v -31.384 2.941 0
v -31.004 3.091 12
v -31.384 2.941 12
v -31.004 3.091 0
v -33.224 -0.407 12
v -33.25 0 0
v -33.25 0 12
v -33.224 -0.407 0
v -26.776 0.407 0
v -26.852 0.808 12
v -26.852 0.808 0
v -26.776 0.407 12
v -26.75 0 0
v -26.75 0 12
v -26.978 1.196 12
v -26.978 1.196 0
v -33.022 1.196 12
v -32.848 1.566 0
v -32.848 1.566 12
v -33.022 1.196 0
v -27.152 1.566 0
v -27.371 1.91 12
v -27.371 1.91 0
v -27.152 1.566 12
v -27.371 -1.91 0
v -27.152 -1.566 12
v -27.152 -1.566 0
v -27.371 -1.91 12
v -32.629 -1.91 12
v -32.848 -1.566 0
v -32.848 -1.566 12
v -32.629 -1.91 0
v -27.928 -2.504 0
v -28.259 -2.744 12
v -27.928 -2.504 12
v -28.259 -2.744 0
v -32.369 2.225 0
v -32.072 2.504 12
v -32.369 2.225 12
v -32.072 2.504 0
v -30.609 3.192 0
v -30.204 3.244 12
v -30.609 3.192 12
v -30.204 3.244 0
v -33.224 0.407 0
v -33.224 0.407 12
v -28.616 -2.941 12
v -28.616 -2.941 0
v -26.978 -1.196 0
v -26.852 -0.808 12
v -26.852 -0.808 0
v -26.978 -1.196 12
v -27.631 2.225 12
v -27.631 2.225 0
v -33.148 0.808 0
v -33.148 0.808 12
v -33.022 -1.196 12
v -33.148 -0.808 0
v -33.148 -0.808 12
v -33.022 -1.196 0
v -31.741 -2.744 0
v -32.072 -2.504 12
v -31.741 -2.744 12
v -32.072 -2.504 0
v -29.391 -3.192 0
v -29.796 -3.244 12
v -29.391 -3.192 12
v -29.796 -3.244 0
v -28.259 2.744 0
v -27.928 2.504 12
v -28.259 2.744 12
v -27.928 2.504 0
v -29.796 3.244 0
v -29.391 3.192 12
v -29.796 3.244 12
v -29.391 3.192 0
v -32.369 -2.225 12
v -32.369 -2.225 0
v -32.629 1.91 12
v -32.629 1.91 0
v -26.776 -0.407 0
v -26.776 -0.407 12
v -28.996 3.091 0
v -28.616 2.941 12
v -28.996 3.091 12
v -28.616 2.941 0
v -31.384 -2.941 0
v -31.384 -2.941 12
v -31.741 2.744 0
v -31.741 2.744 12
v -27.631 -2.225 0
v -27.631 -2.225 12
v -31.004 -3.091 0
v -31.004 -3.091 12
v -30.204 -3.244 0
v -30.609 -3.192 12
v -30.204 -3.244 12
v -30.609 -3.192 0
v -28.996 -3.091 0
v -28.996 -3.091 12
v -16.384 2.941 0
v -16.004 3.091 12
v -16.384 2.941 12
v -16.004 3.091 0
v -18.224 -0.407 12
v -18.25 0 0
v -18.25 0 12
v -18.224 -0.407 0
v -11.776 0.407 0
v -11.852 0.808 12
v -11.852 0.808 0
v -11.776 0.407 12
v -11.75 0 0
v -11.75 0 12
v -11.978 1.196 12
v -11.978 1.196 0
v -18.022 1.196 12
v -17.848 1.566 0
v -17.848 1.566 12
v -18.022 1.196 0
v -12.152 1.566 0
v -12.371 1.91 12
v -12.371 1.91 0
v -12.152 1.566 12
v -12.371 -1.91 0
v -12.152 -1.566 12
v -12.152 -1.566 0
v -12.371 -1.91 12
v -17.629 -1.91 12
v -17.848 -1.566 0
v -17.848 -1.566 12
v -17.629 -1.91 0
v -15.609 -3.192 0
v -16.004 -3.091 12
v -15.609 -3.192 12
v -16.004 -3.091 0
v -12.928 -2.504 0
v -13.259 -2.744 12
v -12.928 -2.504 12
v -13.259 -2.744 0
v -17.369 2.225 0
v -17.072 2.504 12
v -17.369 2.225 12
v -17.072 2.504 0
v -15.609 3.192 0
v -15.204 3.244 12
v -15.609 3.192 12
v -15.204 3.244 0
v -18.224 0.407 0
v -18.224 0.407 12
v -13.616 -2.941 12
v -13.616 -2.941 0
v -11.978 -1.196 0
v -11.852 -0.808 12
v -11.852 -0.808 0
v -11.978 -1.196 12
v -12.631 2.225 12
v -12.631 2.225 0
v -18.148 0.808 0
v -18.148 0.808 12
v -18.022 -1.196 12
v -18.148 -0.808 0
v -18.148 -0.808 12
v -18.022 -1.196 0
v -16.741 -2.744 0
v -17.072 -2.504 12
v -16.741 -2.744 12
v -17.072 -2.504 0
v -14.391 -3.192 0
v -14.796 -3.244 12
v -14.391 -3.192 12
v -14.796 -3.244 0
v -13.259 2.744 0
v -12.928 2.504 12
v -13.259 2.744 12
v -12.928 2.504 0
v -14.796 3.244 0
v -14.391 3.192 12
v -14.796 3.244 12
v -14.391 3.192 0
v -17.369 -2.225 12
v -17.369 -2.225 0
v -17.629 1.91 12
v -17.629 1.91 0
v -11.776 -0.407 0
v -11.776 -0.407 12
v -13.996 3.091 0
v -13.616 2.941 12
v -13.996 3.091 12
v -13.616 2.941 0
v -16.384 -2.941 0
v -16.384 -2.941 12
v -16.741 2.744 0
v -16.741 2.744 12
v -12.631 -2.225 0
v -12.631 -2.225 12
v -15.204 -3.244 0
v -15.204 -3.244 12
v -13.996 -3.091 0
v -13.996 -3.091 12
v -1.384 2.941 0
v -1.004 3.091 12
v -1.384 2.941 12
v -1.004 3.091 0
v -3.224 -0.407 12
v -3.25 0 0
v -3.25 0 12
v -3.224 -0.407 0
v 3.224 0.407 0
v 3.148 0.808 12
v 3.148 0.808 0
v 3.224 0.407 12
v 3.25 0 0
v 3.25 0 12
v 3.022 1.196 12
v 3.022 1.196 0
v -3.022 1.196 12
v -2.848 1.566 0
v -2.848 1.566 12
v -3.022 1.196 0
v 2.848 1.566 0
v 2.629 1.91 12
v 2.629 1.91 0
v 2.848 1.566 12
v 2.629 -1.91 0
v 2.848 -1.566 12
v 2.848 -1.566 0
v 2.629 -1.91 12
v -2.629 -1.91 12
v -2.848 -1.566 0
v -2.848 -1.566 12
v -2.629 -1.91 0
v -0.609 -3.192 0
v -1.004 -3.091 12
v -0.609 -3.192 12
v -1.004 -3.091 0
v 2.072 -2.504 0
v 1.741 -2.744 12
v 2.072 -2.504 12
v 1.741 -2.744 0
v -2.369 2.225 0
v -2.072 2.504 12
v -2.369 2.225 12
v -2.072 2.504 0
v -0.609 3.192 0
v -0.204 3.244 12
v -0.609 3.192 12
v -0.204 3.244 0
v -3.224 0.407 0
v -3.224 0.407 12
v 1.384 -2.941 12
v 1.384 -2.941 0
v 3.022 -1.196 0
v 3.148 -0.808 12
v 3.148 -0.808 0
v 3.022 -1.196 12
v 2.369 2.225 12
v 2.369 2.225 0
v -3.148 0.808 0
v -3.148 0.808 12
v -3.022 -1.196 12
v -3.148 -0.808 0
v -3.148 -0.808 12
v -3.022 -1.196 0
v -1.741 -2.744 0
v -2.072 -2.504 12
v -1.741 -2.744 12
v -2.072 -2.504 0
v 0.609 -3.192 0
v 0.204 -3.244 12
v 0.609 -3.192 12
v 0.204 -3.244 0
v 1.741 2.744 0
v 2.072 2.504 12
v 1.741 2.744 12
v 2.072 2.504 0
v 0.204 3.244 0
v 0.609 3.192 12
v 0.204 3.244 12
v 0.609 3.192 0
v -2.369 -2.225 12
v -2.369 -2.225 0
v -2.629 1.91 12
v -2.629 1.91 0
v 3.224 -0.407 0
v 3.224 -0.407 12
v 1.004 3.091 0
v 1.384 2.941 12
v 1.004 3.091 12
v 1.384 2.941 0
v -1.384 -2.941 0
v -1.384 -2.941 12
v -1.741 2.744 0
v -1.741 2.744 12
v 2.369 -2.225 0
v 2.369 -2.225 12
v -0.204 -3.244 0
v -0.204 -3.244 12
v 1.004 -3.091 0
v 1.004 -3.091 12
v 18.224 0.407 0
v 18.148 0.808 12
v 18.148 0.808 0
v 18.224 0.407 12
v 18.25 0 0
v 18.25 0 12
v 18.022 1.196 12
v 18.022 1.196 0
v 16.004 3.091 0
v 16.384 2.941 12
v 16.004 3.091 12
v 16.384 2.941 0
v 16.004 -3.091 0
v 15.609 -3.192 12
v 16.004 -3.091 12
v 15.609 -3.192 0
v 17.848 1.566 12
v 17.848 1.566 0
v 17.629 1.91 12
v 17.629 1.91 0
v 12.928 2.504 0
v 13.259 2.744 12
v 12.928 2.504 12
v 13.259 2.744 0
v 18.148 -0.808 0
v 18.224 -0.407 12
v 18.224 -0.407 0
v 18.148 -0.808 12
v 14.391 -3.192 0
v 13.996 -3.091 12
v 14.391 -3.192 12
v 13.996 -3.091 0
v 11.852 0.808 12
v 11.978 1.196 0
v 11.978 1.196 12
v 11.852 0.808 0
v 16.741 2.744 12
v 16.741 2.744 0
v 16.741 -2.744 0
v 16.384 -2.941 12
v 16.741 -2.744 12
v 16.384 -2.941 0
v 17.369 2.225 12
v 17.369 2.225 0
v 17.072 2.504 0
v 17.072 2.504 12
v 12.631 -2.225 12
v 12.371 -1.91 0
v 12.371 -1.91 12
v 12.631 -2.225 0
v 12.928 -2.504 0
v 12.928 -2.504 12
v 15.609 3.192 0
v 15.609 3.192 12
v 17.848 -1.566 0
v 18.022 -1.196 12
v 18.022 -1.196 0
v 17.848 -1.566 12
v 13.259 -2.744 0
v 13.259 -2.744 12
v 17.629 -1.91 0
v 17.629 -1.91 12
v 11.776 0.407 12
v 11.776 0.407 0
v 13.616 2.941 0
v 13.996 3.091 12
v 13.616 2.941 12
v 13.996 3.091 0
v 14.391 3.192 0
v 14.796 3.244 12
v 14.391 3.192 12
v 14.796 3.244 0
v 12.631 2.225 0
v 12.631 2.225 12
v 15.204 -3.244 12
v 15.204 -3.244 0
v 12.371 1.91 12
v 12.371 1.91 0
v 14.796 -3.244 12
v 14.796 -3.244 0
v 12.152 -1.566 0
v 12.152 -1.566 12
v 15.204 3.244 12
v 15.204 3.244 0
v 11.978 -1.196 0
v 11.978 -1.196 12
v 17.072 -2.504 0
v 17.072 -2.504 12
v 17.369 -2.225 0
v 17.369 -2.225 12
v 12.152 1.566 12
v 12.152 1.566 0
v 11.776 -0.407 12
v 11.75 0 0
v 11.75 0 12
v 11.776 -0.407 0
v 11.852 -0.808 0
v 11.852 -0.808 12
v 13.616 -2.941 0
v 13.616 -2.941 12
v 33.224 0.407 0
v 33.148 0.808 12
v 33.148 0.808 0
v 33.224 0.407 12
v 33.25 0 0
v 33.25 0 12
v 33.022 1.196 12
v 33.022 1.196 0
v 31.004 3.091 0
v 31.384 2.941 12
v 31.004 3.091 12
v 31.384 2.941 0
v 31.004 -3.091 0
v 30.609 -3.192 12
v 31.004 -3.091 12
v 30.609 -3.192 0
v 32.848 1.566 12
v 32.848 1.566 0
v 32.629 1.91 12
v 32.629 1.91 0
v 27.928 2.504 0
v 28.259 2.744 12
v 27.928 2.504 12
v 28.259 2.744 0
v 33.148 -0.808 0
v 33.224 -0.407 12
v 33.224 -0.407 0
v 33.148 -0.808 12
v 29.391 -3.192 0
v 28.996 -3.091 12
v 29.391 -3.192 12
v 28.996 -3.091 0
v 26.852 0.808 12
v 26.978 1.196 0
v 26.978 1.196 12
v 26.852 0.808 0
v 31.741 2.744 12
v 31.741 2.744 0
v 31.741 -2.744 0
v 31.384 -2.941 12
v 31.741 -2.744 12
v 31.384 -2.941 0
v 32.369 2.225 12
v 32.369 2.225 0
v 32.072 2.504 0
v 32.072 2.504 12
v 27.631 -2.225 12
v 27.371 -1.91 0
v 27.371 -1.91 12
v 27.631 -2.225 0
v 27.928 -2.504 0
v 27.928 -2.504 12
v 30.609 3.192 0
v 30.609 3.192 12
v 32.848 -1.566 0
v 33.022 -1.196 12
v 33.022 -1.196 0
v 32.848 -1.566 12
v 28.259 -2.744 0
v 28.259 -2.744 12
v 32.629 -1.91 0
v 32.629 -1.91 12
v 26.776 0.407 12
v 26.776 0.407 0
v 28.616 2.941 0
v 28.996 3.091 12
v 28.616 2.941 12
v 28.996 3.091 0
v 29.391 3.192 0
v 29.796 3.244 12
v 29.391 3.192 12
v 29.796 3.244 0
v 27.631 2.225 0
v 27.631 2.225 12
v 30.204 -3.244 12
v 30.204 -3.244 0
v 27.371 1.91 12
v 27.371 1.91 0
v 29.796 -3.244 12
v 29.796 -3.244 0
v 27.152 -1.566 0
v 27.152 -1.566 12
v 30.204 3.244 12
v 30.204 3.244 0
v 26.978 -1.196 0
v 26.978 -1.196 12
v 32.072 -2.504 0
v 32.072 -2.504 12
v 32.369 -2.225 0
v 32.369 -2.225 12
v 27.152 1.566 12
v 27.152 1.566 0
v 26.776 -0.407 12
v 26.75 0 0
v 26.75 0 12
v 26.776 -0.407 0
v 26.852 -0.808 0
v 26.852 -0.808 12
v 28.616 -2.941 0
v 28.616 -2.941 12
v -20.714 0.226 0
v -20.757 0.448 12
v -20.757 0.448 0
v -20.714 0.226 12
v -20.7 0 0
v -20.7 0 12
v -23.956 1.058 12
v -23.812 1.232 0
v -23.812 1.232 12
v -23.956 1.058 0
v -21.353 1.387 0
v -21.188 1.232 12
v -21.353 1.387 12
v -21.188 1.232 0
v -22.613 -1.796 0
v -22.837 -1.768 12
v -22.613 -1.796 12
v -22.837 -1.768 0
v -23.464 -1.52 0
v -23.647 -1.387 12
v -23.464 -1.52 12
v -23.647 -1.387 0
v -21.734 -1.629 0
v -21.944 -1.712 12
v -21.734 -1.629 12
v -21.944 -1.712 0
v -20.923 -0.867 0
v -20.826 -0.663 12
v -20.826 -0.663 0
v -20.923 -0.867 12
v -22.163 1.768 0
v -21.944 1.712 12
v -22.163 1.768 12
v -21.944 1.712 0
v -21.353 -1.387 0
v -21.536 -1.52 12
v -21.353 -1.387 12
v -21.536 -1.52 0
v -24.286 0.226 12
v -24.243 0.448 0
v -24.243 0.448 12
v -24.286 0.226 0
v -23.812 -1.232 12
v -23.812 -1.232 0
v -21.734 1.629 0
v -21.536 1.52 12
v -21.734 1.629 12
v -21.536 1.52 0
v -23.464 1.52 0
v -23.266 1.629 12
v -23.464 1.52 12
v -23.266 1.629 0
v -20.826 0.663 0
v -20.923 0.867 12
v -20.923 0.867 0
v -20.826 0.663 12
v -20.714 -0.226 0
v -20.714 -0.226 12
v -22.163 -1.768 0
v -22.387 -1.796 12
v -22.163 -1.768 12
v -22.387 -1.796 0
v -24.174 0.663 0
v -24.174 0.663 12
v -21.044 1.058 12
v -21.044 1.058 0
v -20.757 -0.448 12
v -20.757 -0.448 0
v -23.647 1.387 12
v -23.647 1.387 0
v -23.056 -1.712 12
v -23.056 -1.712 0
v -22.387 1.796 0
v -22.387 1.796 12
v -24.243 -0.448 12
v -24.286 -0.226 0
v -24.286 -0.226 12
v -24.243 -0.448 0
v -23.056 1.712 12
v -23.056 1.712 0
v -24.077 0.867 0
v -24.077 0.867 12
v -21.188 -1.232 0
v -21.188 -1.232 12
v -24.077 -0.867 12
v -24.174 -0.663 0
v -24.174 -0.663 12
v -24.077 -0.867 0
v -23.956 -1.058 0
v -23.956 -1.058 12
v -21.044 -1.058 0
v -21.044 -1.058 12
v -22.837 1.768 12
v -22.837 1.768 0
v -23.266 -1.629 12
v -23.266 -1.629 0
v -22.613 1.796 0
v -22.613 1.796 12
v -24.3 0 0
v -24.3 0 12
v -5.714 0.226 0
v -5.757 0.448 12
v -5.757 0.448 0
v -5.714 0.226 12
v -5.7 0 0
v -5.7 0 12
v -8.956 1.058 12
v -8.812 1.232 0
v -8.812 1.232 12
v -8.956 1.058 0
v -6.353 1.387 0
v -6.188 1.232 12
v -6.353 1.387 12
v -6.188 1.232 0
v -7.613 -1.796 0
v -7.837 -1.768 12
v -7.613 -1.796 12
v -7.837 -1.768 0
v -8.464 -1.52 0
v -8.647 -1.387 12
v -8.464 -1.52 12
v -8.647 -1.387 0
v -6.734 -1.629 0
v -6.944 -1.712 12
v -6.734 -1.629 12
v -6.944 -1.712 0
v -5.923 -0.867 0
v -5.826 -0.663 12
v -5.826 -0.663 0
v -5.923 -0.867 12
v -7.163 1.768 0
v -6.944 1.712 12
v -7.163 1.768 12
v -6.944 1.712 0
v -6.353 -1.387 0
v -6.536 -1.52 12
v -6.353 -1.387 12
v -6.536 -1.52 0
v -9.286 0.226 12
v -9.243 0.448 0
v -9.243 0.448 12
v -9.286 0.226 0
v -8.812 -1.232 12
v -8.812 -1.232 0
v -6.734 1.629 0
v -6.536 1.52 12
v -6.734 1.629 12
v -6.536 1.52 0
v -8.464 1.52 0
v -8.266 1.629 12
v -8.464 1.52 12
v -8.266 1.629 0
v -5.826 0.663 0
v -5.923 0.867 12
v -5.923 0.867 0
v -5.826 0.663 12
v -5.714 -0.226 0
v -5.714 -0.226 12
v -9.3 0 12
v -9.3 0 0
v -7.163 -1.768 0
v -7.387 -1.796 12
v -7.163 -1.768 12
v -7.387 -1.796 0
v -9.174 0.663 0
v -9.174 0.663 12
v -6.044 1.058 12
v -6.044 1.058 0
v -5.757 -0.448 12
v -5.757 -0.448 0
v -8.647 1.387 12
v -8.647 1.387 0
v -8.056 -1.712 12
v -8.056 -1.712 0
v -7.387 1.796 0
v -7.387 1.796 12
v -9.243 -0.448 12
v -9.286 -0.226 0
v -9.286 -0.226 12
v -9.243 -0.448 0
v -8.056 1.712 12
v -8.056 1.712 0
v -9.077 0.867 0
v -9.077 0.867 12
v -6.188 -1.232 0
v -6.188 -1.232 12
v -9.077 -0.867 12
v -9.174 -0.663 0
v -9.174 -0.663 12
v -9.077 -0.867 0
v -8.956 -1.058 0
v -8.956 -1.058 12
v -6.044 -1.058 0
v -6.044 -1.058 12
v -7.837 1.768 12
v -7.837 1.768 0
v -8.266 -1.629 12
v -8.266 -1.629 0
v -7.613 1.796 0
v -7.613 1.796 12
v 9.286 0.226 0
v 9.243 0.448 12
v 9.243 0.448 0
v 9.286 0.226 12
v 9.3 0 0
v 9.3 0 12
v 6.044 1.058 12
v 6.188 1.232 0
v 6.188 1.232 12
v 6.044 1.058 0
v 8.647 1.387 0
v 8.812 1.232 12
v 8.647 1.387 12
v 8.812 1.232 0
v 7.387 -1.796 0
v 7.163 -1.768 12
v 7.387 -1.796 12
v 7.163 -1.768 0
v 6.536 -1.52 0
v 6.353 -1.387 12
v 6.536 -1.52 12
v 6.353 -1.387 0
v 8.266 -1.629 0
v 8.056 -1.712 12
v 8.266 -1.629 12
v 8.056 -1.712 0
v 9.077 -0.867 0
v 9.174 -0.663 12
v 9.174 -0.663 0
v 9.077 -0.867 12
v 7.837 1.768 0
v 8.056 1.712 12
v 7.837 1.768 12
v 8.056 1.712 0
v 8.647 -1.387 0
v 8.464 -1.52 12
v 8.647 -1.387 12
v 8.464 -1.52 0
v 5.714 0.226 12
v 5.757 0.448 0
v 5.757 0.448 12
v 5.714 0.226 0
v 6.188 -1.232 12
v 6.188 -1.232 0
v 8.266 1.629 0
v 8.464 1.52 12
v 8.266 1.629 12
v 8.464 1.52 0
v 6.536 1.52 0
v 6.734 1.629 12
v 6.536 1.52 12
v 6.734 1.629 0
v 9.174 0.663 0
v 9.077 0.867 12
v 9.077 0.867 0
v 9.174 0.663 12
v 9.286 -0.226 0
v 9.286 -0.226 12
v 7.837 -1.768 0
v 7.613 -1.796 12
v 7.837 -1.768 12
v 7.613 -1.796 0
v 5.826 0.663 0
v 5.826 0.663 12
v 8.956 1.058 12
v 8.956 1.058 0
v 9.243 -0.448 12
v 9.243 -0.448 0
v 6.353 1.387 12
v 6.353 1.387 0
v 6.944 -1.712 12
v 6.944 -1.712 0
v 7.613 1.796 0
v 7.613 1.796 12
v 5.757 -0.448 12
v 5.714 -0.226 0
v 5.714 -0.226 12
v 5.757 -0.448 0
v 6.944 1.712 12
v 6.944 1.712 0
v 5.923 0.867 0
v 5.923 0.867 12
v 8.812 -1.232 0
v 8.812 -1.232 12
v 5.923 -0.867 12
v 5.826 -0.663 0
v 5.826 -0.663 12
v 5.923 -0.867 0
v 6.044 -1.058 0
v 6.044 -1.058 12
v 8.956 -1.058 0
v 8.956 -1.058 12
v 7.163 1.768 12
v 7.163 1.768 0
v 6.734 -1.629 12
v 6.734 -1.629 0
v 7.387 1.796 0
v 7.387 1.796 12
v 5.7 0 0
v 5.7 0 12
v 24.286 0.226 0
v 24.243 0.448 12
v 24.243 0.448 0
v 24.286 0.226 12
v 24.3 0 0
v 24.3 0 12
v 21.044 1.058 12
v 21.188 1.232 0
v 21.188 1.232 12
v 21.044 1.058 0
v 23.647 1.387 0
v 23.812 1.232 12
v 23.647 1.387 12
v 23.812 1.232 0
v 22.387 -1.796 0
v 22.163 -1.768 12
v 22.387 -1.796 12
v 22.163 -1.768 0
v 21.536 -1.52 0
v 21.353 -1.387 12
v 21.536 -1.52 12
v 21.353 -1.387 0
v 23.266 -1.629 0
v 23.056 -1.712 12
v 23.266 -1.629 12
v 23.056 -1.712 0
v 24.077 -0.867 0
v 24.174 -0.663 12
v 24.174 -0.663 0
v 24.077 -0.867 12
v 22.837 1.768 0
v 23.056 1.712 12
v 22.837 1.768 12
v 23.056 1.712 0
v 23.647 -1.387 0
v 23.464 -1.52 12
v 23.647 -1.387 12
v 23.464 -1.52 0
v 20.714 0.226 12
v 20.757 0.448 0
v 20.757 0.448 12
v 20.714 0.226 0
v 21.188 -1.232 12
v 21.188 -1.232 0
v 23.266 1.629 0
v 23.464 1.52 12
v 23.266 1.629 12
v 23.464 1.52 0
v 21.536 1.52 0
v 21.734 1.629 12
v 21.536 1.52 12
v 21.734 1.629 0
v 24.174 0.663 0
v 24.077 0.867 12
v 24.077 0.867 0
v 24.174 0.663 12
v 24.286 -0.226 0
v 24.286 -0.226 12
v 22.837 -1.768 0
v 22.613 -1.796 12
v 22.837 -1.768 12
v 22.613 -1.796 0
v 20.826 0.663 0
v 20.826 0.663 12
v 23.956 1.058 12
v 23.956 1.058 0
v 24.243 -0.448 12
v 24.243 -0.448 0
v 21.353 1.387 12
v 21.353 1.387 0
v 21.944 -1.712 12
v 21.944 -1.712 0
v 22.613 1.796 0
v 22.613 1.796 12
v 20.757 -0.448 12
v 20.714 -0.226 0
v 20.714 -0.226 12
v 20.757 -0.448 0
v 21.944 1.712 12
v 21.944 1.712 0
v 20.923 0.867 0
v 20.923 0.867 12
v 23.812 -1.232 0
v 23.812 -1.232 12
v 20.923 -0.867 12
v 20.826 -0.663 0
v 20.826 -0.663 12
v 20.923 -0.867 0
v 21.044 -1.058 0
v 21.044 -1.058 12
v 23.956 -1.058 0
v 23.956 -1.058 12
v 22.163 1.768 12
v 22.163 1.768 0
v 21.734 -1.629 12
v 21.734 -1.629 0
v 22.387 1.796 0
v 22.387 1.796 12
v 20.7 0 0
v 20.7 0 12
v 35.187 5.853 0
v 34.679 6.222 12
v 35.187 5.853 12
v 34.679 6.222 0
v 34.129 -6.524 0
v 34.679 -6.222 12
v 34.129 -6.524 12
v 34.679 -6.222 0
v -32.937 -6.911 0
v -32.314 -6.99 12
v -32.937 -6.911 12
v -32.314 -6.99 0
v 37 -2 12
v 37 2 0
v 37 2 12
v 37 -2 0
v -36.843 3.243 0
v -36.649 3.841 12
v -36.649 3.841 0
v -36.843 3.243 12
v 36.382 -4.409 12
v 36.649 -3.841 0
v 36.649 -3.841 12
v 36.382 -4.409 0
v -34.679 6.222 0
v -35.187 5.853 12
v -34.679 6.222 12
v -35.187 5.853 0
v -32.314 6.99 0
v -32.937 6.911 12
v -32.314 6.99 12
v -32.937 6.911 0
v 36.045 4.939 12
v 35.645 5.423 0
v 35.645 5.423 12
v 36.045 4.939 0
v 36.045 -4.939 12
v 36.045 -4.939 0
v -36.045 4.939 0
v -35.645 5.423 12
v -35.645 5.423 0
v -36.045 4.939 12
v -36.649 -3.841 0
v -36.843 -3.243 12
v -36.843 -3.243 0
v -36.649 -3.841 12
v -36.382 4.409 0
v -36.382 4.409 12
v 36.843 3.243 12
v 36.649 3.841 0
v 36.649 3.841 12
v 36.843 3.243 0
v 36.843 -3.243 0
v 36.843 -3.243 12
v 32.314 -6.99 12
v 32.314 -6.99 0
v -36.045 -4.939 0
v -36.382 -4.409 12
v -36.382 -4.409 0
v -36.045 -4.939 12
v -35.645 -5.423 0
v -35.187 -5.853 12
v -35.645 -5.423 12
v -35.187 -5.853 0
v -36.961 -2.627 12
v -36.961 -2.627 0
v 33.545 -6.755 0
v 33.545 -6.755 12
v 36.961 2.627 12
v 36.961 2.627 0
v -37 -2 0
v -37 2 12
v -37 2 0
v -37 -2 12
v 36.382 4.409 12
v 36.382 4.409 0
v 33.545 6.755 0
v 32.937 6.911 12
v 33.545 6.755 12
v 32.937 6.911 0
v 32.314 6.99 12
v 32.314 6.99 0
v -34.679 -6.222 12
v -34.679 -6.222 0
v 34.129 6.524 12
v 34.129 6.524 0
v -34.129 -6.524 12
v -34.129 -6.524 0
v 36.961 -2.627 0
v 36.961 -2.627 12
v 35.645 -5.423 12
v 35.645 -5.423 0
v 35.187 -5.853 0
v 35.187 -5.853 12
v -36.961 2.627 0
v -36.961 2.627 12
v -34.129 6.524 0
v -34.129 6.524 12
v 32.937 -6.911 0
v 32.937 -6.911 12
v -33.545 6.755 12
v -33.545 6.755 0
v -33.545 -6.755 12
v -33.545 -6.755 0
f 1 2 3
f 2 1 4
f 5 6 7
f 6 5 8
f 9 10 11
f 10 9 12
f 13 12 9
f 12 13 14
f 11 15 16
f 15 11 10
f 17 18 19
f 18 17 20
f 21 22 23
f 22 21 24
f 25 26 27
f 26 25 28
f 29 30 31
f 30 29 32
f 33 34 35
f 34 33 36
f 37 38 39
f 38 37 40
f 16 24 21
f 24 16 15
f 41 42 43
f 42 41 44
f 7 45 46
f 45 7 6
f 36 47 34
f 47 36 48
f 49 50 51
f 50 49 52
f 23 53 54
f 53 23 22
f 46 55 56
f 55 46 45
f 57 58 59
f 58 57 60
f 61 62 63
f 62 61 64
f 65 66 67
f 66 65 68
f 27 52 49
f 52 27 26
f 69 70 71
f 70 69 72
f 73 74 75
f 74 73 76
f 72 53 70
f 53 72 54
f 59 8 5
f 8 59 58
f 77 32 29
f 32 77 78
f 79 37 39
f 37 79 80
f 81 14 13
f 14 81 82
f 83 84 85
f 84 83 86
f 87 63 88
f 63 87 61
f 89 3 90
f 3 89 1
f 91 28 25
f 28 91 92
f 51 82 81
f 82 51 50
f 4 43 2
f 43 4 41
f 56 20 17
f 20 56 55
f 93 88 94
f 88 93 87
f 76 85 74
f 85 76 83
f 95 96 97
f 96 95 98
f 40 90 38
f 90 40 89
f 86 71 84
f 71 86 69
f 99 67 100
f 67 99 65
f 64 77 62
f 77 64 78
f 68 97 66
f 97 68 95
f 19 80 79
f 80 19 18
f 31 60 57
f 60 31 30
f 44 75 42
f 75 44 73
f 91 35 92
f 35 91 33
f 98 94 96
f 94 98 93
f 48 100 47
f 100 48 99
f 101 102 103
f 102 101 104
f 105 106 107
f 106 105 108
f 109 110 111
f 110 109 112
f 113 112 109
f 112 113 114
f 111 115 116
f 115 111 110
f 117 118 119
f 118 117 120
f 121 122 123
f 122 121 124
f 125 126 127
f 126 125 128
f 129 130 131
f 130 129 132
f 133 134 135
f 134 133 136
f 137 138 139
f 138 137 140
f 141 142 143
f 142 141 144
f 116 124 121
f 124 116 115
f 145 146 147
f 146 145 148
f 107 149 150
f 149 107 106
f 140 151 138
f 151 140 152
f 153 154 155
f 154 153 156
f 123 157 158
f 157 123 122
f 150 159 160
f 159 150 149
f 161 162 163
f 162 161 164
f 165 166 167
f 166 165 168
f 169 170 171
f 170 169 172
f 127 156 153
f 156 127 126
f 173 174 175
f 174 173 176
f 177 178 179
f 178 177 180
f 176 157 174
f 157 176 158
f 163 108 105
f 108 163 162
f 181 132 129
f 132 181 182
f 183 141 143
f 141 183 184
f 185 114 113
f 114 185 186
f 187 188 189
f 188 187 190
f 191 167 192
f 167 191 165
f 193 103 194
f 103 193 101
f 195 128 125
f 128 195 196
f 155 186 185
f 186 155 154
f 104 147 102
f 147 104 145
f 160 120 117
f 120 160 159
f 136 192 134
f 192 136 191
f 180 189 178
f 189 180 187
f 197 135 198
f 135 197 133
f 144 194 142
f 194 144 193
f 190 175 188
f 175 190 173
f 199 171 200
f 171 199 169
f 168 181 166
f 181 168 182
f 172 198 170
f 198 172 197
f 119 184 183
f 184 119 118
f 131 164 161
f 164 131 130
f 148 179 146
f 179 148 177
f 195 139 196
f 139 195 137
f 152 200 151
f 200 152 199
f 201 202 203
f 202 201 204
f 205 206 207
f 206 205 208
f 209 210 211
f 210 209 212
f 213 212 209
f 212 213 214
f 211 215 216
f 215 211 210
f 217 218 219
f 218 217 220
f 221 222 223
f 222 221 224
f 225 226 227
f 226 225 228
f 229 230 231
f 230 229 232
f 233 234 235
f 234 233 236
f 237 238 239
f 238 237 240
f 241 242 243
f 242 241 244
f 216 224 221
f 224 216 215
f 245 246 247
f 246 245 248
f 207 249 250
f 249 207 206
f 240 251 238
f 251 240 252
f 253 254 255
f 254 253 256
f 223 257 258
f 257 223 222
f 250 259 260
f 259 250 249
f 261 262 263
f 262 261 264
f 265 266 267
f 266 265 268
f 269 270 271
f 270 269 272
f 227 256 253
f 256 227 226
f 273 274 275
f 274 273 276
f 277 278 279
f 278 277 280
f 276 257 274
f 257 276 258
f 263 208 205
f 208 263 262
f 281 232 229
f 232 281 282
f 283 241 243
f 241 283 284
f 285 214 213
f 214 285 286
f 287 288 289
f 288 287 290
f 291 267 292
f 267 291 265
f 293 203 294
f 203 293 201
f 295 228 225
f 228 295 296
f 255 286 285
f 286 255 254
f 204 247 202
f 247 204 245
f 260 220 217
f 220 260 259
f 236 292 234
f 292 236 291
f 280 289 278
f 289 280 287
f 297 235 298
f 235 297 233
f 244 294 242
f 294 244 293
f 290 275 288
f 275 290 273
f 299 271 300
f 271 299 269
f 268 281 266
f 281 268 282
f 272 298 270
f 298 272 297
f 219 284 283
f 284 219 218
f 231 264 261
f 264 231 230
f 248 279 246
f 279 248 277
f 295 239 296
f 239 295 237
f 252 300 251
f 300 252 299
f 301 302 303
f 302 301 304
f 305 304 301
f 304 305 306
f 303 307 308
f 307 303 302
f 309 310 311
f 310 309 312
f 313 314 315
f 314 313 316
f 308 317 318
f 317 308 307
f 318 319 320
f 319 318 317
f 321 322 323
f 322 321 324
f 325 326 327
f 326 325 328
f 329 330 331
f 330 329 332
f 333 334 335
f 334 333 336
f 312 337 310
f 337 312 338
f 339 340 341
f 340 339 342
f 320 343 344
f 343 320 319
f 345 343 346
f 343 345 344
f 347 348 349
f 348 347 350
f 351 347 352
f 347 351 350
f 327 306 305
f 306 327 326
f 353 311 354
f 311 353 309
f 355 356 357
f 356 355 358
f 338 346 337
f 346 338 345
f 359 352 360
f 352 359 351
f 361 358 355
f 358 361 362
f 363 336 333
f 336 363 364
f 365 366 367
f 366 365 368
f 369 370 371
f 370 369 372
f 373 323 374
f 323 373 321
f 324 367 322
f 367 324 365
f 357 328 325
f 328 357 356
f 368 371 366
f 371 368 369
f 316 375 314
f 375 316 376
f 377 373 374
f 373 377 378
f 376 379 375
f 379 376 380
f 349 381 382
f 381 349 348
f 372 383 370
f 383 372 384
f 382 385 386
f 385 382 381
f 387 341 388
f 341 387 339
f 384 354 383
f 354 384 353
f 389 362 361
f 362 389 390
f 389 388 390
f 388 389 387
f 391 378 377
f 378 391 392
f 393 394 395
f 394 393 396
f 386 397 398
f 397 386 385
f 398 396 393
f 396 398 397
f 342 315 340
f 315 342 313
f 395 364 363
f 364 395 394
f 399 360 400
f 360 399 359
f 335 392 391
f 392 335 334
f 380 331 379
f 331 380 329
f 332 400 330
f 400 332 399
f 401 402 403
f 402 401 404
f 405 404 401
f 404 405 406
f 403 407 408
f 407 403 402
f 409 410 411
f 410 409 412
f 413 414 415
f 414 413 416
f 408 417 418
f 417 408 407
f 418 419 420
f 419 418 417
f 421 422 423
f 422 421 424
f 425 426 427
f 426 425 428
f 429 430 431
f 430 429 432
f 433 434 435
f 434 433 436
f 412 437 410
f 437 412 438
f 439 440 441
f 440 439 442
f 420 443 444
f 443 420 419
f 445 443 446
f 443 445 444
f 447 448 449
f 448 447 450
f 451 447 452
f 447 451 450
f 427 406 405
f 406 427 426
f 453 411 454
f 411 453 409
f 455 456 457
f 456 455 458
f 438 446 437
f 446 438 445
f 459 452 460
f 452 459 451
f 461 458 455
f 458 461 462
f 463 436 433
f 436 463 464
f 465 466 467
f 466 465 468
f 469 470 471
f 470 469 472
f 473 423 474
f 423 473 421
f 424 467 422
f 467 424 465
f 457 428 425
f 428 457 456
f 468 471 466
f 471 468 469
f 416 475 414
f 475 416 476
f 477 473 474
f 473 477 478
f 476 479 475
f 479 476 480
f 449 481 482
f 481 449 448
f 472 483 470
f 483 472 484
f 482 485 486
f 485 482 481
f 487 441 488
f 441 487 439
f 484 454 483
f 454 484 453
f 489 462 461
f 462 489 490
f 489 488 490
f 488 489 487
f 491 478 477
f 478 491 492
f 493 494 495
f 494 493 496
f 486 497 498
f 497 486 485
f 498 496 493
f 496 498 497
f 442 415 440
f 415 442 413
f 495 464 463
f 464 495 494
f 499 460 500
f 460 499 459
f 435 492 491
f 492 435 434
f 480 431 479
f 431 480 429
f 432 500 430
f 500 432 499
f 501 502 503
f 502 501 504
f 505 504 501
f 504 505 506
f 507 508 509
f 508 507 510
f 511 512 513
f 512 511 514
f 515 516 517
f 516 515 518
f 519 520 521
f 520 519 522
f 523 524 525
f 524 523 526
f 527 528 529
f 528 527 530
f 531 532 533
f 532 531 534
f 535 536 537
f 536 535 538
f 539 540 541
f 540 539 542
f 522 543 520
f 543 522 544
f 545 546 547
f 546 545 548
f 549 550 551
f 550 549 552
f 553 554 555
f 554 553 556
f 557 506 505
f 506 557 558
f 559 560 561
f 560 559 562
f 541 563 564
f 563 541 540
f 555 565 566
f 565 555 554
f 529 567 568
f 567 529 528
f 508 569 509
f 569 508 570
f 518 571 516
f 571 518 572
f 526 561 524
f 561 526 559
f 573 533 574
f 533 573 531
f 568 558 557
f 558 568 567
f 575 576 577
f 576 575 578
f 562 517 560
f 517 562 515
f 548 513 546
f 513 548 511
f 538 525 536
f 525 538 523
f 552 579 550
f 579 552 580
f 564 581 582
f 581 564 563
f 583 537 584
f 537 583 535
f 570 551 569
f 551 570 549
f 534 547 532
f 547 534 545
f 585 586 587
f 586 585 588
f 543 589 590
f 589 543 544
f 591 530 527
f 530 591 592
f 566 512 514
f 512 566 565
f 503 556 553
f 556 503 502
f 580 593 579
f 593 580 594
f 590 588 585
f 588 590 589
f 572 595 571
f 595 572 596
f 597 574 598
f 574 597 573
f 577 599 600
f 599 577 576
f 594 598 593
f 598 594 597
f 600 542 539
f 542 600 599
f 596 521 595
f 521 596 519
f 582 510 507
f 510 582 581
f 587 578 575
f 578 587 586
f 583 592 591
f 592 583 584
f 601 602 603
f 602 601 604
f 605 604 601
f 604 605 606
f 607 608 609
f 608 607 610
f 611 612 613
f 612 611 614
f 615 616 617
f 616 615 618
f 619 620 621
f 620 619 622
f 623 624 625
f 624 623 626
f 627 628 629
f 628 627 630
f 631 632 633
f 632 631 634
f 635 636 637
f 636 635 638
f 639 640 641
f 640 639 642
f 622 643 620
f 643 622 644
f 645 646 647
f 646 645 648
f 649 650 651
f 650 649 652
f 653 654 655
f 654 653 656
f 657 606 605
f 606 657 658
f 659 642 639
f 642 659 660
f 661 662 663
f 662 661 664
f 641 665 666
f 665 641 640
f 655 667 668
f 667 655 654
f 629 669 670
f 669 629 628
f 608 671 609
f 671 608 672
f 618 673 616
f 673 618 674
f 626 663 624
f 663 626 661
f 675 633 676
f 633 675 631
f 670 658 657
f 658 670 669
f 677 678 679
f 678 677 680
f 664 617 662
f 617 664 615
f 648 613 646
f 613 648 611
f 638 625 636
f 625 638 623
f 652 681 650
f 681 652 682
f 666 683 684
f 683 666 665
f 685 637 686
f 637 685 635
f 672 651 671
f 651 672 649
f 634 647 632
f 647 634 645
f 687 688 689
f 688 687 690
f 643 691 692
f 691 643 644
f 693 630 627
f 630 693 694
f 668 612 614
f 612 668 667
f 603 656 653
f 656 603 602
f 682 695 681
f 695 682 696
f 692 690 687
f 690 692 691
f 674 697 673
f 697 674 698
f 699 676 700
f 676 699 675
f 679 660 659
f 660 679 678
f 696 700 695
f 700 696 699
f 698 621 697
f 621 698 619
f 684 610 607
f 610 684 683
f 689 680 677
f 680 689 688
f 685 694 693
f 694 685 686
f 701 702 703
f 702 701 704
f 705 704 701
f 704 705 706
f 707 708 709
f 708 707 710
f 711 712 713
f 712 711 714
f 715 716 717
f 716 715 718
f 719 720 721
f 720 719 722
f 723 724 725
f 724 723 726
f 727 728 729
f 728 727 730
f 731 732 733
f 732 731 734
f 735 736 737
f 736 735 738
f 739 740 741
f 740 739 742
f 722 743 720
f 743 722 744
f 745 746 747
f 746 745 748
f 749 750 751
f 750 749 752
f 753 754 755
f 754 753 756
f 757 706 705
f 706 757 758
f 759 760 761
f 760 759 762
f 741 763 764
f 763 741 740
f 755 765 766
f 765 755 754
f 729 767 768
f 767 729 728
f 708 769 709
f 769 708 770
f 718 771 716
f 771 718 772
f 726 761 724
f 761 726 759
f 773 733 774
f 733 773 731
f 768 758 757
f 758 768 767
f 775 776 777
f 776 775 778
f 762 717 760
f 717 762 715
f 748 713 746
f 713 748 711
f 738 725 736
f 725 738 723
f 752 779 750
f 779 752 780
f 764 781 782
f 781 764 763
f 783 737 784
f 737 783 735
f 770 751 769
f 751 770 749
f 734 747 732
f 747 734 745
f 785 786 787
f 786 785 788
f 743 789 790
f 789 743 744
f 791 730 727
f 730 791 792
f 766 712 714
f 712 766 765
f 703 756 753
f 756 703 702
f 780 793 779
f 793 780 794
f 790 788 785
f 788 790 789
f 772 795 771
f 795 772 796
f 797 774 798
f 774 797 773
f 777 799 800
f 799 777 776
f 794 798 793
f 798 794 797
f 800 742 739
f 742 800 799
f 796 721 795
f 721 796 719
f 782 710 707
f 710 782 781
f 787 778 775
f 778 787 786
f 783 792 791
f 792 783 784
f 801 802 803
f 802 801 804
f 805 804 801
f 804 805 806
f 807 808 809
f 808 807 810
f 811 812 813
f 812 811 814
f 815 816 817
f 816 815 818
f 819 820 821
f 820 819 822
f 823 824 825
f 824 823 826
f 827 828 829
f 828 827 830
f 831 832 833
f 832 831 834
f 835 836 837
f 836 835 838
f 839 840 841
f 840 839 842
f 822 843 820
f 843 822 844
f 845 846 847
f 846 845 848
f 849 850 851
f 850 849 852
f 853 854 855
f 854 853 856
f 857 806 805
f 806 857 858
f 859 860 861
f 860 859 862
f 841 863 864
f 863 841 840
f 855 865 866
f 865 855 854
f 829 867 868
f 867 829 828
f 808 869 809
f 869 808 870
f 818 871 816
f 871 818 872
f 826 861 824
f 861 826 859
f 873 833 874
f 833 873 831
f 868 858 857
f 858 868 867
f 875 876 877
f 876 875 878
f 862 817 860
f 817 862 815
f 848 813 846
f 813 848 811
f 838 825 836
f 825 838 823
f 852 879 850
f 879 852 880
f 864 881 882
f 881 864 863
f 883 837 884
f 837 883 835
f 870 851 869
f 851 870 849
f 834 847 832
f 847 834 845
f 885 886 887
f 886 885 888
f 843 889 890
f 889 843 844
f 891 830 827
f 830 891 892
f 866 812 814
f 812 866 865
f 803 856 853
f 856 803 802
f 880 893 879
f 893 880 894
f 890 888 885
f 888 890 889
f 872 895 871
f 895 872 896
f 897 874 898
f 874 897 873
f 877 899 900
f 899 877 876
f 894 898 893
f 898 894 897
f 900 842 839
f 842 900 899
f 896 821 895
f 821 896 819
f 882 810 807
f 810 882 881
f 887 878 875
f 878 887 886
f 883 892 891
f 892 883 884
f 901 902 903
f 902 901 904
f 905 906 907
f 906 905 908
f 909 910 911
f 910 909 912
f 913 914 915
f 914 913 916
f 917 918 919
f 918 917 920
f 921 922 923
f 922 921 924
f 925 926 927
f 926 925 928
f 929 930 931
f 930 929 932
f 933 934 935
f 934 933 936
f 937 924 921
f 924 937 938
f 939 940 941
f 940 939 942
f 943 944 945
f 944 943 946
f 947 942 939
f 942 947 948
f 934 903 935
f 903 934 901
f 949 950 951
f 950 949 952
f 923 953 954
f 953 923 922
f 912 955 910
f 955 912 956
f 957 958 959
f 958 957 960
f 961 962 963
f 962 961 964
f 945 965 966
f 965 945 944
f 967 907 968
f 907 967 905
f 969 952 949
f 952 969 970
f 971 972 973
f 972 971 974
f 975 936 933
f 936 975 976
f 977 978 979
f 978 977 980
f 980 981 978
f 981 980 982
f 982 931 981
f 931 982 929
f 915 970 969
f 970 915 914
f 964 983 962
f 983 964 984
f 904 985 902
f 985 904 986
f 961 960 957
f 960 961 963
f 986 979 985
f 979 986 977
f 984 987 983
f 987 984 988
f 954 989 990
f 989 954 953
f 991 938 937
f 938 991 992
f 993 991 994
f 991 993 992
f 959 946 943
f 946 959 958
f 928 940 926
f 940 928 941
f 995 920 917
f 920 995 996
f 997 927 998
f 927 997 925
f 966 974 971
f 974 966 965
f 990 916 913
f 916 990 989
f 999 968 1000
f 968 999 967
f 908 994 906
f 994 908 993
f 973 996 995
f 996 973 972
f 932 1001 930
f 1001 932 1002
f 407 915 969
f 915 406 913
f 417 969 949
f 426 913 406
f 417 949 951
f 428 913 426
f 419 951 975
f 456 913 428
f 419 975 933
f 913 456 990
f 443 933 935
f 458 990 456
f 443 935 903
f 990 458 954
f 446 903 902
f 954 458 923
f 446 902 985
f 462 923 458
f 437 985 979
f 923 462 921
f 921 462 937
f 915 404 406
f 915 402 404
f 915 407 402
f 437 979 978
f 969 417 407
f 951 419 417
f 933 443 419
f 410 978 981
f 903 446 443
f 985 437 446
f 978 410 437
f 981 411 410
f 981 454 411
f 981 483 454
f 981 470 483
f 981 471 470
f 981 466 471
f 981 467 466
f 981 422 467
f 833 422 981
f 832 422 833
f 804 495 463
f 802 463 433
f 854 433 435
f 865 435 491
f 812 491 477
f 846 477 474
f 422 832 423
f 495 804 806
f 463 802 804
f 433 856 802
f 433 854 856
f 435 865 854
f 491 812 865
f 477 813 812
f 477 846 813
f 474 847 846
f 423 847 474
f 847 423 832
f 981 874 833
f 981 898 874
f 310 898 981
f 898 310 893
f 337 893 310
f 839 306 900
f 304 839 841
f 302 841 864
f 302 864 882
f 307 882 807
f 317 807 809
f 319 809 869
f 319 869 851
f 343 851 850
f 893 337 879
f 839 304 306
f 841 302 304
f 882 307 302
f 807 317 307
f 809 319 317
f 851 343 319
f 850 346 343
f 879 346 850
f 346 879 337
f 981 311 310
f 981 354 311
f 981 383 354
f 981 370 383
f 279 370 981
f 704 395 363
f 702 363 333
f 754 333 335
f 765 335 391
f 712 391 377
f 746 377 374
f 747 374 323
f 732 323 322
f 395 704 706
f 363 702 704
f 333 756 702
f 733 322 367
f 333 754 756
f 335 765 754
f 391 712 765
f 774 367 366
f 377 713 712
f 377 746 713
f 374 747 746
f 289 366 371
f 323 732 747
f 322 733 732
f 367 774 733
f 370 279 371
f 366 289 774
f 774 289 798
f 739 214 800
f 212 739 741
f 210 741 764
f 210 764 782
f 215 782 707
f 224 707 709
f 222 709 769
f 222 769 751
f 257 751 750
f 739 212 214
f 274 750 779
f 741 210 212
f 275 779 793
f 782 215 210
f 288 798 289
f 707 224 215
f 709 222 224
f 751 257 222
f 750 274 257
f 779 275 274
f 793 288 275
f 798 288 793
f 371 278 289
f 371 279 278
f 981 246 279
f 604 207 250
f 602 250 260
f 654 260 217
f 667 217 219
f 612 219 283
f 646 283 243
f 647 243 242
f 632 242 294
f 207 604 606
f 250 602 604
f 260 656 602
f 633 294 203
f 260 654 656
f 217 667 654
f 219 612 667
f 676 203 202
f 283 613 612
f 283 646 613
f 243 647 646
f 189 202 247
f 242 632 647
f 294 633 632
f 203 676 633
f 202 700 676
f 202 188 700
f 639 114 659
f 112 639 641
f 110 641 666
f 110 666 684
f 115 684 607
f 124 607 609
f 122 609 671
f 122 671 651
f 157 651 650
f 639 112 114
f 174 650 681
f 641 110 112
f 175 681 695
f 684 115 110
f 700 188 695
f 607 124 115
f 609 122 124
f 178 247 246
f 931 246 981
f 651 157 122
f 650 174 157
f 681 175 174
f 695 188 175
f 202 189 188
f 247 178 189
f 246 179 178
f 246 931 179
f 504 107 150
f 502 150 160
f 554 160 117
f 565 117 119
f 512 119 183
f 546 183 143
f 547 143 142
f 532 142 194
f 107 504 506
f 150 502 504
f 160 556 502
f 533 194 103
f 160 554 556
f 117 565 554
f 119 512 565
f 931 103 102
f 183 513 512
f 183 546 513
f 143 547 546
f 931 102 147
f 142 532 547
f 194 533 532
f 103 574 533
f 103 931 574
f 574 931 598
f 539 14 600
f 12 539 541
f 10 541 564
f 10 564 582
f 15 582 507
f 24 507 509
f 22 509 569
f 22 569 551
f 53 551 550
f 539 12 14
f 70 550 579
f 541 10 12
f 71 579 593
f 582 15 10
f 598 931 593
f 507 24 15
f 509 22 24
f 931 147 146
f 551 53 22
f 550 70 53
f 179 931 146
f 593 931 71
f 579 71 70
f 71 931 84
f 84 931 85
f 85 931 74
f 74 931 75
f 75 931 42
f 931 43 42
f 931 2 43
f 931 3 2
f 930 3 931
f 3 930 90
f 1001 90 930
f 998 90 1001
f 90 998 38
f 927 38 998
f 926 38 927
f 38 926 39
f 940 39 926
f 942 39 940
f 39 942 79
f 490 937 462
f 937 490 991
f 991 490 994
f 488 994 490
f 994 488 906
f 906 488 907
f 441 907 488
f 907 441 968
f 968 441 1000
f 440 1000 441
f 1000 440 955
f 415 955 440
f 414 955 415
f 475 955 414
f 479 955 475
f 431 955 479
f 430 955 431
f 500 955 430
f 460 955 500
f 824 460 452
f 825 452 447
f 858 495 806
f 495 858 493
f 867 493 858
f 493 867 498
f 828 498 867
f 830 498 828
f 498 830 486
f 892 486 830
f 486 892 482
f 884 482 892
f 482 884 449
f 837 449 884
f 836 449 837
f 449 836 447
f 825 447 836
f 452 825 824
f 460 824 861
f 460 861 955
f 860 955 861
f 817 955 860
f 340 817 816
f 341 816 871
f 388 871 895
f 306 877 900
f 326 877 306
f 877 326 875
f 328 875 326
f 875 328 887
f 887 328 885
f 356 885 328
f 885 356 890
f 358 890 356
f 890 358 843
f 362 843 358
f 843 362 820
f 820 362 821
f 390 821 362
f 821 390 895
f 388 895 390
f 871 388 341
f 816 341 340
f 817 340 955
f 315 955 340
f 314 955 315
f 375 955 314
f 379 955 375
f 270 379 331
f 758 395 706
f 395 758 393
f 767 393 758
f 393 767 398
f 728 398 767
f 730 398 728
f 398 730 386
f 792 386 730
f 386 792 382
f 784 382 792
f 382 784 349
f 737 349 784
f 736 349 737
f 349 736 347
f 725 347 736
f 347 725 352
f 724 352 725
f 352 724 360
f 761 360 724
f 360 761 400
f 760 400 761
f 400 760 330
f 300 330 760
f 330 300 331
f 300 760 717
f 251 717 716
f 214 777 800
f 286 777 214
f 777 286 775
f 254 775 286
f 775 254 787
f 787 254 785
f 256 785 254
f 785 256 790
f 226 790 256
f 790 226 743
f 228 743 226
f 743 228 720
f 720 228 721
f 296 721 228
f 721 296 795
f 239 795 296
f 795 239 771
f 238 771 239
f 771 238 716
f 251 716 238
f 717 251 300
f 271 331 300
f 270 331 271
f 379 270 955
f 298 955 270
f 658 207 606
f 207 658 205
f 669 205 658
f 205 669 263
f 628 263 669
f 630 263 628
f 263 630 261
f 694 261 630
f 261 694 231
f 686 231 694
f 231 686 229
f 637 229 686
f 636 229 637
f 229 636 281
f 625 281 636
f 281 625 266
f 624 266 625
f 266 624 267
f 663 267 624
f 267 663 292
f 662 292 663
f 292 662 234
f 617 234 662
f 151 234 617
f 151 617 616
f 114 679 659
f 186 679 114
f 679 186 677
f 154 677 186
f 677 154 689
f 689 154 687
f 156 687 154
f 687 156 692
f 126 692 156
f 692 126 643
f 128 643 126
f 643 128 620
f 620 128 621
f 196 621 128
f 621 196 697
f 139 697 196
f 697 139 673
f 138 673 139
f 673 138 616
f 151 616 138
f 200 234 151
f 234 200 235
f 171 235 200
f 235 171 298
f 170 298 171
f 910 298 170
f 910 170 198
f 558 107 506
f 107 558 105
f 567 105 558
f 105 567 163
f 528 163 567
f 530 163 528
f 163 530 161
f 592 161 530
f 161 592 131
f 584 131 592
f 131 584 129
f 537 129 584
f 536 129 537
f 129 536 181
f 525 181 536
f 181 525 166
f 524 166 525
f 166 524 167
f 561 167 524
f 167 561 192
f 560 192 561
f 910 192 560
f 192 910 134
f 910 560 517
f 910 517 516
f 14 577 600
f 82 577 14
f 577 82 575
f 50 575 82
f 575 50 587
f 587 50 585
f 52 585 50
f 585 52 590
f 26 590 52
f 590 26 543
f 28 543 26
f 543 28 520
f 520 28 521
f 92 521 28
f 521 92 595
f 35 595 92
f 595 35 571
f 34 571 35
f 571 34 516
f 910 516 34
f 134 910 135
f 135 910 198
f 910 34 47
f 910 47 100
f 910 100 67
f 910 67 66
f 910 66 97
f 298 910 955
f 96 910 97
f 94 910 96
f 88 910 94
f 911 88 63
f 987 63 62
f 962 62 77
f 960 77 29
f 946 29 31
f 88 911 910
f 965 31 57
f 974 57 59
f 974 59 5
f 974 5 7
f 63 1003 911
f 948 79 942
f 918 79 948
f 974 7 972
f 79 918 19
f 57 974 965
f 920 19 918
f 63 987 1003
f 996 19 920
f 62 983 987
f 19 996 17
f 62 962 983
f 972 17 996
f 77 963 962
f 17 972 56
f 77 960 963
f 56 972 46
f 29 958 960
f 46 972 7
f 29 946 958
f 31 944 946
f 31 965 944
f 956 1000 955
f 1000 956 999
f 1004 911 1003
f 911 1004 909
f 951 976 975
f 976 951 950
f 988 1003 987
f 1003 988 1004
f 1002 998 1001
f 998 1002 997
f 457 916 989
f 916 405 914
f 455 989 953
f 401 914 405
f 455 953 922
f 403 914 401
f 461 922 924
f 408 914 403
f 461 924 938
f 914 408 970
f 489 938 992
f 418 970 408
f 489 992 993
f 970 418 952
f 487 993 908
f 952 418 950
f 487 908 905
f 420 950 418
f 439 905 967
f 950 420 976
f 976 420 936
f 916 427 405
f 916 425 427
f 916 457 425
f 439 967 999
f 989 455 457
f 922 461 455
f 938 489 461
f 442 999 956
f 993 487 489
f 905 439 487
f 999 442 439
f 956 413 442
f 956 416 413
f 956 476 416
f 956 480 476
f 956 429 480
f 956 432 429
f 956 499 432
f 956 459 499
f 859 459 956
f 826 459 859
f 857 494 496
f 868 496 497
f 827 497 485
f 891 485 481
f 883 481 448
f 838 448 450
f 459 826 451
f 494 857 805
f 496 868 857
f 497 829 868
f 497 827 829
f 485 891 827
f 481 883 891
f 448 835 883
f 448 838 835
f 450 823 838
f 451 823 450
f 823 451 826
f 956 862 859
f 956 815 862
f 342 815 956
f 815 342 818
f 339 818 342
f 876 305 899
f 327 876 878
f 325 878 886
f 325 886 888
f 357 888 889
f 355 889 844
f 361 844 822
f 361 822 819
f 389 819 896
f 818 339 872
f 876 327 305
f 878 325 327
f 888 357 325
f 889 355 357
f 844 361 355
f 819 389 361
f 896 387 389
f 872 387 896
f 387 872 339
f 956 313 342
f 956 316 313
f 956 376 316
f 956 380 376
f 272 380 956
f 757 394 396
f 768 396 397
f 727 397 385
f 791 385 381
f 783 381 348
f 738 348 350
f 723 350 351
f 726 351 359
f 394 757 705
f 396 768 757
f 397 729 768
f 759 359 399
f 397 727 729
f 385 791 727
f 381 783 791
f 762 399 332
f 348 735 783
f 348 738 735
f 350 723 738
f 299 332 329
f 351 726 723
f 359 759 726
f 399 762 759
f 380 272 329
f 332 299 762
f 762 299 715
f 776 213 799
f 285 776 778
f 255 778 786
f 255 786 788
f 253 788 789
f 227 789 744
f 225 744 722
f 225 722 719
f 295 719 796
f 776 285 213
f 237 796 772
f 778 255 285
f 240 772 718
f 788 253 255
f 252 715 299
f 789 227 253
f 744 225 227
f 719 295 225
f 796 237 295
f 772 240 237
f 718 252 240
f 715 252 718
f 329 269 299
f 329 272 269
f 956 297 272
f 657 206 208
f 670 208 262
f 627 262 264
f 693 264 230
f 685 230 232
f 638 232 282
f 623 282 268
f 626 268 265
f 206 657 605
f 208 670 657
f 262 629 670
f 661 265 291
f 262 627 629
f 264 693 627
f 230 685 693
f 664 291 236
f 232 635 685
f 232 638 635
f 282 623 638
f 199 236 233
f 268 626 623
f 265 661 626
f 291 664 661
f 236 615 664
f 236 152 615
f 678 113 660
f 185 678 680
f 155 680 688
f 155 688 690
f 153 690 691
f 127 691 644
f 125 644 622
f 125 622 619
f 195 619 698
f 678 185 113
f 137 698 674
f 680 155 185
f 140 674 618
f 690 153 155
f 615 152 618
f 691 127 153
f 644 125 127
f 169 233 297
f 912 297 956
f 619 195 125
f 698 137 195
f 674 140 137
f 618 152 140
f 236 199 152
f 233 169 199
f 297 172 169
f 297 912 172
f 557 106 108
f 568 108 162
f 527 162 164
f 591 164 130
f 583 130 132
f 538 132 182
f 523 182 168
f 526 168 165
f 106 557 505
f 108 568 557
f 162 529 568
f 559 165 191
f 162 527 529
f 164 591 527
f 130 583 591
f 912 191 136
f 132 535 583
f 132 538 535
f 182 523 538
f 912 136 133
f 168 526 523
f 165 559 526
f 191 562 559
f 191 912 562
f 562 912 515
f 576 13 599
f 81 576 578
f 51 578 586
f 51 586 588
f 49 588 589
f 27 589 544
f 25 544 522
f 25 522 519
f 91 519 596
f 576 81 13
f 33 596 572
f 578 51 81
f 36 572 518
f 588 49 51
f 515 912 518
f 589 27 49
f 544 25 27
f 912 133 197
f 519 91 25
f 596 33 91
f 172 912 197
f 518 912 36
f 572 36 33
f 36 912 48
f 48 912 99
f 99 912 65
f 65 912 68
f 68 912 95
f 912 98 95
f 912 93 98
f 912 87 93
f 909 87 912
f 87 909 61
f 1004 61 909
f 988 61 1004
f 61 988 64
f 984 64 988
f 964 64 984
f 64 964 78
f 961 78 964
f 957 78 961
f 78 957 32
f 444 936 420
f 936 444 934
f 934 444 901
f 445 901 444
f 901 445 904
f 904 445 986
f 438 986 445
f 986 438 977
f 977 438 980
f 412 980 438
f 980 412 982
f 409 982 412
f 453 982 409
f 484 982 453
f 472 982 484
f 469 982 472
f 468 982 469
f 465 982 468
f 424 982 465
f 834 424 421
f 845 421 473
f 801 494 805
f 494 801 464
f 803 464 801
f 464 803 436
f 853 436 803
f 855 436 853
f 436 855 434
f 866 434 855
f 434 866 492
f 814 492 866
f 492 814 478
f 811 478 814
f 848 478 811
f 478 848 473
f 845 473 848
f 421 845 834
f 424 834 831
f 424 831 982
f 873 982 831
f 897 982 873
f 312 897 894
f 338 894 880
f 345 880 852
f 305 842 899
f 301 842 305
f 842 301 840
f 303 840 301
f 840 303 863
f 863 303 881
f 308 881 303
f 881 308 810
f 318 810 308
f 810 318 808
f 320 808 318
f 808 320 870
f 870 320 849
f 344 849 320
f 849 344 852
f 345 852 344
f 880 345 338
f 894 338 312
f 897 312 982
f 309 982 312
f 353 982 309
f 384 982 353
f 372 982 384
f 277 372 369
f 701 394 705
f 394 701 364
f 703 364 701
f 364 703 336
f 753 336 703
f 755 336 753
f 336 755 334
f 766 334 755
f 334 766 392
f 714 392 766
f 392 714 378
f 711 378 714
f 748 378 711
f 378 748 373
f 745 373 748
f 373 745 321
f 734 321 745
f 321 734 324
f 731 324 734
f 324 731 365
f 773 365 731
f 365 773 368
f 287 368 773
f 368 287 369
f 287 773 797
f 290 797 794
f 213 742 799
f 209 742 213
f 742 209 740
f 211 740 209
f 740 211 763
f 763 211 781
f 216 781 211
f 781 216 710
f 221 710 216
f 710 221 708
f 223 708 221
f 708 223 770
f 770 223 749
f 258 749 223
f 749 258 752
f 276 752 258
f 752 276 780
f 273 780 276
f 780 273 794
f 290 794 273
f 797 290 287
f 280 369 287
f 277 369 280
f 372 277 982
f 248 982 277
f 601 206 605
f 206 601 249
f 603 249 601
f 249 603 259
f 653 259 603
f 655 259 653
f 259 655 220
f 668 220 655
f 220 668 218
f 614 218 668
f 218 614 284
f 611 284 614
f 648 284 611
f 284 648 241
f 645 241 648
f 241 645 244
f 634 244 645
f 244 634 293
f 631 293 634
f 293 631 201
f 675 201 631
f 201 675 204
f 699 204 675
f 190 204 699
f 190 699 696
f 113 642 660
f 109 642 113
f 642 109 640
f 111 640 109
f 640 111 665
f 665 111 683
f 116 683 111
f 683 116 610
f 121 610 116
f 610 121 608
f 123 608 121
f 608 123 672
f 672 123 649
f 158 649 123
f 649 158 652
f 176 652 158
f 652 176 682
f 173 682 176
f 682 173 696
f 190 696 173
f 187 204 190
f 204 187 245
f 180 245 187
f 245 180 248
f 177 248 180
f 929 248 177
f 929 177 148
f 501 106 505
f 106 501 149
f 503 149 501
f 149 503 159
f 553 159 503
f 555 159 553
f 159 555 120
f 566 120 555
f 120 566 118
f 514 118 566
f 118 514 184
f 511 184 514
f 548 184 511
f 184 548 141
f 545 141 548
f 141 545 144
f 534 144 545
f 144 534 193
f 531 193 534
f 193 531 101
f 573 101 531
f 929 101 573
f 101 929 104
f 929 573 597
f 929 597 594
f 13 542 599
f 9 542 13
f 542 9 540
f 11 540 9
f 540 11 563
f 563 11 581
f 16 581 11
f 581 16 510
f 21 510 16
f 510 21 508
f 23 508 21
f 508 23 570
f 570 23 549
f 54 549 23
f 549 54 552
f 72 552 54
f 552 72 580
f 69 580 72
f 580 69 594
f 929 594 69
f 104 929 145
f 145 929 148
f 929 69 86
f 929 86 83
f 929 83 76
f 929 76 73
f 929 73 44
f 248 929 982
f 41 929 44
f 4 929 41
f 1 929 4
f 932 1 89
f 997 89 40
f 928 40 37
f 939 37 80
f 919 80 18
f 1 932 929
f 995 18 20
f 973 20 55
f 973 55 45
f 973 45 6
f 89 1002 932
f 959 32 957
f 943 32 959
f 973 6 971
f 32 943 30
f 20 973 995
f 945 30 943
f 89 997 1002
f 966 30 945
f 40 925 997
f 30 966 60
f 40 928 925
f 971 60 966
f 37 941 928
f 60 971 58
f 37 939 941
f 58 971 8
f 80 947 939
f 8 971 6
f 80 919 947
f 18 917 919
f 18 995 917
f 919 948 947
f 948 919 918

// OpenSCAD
$fn = 50;


difference() {
	union() {
		translate(v = [0, 0, 0]) {
			rotate(a = [0, 0, 0]) {
				hull() {
					translate(v = [-32.0000000000, 2.0000000000, 0]) {
						rotate(a = [0, 0, 0]) {
							translate(v = [0, 0, 0]) {
								rotate(a = [0, 0, 0]) {
									cylinder(h = 12, r = 5);
								}
							}
						}
					}
					translate(v = [32.0000000000, 2.0000000000, 0]) {
						rotate(a = [0, 0, 0]) {
							translate(v = [0, 0, 0]) {
								rotate(a = [0, 0, 0]) {
									cylinder(h = 12, r = 5);
								}
							}
						}
					}
					translate(v = [-32.0000000000, -2.0000000000, 0]) {
						rotate(a = [0, 0, 0]) {
							translate(v = [0, 0, 0]) {
								rotate(a = [0, 0, 0]) {
									cylinder(h = 12, r = 5);
								}
							}
						}
					}
					translate(v = [32.0000000000, -2.0000000000, 0]) {
						rotate(a = [0, 0, 0]) {
							translate(v = [0, 0, 0]) {
								rotate(a = [0, 0, 0]) {
									cylinder(h = 12, r = 5);
								}
							}
						}
					}
				}
			}
		}
	}
	union() {
		translate(v = [-30.0000000000, 0.0000000000, 0]) {
			rotate(a = [0, 0, 0]) {
				translate(v = [0, 0, -50]) {
					rotate(a = [0, 0, 0]) {
						cylinder(h = 100, r = 3.2500000000);
					}
				}
			}
		}
		translate(v = [-15.0000000000, 0.0000000000, 0]) {
			rotate(a = [0, 0, 0]) {
				translate(v = [0, 0, -50]) {
					rotate(a = [0, 0, 0]) {
						cylinder(h = 100, r = 3.2500000000);
					}
				}
			}
		}
		translate(v = [0.0000000000, 0.0000000000, 0]) {
			rotate(a = [0, 0, 0]) {
				translate(v = [0, 0, -50]) {
					rotate(a = [0, 0, 0]) {
						cylinder(h = 100, r = 3.2500000000);
					}
				}
			}
		}
		translate(v = [15.0000000000, 0.0000000000, 0]) {
			rotate(a = [0, 0, 0]) {
				translate(v = [0, 0, -50]) {
					rotate(a = [0, 0, 0]) {
						cylinder(h = 100, r = 3.2500000000);
					}
				}
			}
		}
		translate(v = [30.0000000000, 0.0000000000, 0]) {
			rotate(a = [0, 0, 0]) {
				translate(v = [0, 0, -50]) {
					rotate(a = [0, 0, 0]) {
						cylinder(h = 100, r = 3.2500000000);
					}
				}
			}
		}
		translate(v = [-30.0000000000, 0.0000000000, 0]) {
			rotate(a = [0, 0, 0]) {
				translate(v = [0, 0, -50]) {
					rotate(a = [0, 0, 0]) {
						cylinder(h = 100, r = 1.8000000000);
					}
				}
			}
		}
		translate(v = [-22.5000000000, 0.0000000000, 0]) {
			rotate(a = [0, 0, 0]) {
				translate(v = [0, 0, -50]) {
					rotate(a = [0, 0, 0]) {
						cylinder(h = 100, r = 1.8000000000);
					}
				}
			}
		}
		translate(v = [-15.0000000000, 0.0000000000, 0]) {
			rotate(a = [0, 0, 0]) {
				translate(v = [0, 0, -50]) {
					rotate(a = [0, 0, 0]) {
						cylinder(h = 100, r = 1.8000000000);
					}
				}
			}
		}
		translate(v = [-7.5000000000, 0.0000000000, 0]) {
			rotate(a = [0, 0, 0]) {
				translate(v = [0, 0, -50]) {
					rotate(a = [0, 0, 0]) {
						cylinder(h = 100, r = 1.8000000000);
					}
				}
			}
		}
		translate(v = [0.0000000000, 0.0000000000, 0]) {
			rotate(a = [0, 0, 0]) {
				translate(v = [0, 0, -50]) {
					rotate(a = [0, 0, 0]) {
						cylinder(h = 100, r = 1.8000000000);
					}
				}
			}
		}
		translate(v = [7.5000000000, 0.0000000000, 0]) {
			rotate(a = [0, 0, 0]) {
				translate(v = [0, 0, -50]) {
					rotate(a = [0, 0, 0]) {
						cylinder(h = 100, r = 1.8000000000);
					}
				}
			}
		}
		translate(v = [15.0000000000, 0.0000000000, 0]) {
			rotate(a = [0, 0, 0]) {
				translate(v = [0, 0, -50]) {
					rotate(a = [0, 0, 0]) {
						cylinder(h = 100, r = 1.8000000000);
					}
				}
			}
		}
		translate(v = [22.5000000000, 0.0000000000, 0]) {
			rotate(a = [0, 0, 0]) {
				translate(v = [0, 0, -50]) {
					rotate(a = [0, 0, 0]) {
						cylinder(h = 100, r = 1.8000000000);
					}
				}
			}
		}
		translate(v = [30.0000000000, 0.0000000000, 0]) {
			rotate(a = [0, 0, 0]) {
				translate(v = [0, 0, -50]) {
					rotate(a = [0, 0, 0]) {
						cylinder(h = 100, r = 1.8000000000);
					}
				}
			}
		}
	}
}
